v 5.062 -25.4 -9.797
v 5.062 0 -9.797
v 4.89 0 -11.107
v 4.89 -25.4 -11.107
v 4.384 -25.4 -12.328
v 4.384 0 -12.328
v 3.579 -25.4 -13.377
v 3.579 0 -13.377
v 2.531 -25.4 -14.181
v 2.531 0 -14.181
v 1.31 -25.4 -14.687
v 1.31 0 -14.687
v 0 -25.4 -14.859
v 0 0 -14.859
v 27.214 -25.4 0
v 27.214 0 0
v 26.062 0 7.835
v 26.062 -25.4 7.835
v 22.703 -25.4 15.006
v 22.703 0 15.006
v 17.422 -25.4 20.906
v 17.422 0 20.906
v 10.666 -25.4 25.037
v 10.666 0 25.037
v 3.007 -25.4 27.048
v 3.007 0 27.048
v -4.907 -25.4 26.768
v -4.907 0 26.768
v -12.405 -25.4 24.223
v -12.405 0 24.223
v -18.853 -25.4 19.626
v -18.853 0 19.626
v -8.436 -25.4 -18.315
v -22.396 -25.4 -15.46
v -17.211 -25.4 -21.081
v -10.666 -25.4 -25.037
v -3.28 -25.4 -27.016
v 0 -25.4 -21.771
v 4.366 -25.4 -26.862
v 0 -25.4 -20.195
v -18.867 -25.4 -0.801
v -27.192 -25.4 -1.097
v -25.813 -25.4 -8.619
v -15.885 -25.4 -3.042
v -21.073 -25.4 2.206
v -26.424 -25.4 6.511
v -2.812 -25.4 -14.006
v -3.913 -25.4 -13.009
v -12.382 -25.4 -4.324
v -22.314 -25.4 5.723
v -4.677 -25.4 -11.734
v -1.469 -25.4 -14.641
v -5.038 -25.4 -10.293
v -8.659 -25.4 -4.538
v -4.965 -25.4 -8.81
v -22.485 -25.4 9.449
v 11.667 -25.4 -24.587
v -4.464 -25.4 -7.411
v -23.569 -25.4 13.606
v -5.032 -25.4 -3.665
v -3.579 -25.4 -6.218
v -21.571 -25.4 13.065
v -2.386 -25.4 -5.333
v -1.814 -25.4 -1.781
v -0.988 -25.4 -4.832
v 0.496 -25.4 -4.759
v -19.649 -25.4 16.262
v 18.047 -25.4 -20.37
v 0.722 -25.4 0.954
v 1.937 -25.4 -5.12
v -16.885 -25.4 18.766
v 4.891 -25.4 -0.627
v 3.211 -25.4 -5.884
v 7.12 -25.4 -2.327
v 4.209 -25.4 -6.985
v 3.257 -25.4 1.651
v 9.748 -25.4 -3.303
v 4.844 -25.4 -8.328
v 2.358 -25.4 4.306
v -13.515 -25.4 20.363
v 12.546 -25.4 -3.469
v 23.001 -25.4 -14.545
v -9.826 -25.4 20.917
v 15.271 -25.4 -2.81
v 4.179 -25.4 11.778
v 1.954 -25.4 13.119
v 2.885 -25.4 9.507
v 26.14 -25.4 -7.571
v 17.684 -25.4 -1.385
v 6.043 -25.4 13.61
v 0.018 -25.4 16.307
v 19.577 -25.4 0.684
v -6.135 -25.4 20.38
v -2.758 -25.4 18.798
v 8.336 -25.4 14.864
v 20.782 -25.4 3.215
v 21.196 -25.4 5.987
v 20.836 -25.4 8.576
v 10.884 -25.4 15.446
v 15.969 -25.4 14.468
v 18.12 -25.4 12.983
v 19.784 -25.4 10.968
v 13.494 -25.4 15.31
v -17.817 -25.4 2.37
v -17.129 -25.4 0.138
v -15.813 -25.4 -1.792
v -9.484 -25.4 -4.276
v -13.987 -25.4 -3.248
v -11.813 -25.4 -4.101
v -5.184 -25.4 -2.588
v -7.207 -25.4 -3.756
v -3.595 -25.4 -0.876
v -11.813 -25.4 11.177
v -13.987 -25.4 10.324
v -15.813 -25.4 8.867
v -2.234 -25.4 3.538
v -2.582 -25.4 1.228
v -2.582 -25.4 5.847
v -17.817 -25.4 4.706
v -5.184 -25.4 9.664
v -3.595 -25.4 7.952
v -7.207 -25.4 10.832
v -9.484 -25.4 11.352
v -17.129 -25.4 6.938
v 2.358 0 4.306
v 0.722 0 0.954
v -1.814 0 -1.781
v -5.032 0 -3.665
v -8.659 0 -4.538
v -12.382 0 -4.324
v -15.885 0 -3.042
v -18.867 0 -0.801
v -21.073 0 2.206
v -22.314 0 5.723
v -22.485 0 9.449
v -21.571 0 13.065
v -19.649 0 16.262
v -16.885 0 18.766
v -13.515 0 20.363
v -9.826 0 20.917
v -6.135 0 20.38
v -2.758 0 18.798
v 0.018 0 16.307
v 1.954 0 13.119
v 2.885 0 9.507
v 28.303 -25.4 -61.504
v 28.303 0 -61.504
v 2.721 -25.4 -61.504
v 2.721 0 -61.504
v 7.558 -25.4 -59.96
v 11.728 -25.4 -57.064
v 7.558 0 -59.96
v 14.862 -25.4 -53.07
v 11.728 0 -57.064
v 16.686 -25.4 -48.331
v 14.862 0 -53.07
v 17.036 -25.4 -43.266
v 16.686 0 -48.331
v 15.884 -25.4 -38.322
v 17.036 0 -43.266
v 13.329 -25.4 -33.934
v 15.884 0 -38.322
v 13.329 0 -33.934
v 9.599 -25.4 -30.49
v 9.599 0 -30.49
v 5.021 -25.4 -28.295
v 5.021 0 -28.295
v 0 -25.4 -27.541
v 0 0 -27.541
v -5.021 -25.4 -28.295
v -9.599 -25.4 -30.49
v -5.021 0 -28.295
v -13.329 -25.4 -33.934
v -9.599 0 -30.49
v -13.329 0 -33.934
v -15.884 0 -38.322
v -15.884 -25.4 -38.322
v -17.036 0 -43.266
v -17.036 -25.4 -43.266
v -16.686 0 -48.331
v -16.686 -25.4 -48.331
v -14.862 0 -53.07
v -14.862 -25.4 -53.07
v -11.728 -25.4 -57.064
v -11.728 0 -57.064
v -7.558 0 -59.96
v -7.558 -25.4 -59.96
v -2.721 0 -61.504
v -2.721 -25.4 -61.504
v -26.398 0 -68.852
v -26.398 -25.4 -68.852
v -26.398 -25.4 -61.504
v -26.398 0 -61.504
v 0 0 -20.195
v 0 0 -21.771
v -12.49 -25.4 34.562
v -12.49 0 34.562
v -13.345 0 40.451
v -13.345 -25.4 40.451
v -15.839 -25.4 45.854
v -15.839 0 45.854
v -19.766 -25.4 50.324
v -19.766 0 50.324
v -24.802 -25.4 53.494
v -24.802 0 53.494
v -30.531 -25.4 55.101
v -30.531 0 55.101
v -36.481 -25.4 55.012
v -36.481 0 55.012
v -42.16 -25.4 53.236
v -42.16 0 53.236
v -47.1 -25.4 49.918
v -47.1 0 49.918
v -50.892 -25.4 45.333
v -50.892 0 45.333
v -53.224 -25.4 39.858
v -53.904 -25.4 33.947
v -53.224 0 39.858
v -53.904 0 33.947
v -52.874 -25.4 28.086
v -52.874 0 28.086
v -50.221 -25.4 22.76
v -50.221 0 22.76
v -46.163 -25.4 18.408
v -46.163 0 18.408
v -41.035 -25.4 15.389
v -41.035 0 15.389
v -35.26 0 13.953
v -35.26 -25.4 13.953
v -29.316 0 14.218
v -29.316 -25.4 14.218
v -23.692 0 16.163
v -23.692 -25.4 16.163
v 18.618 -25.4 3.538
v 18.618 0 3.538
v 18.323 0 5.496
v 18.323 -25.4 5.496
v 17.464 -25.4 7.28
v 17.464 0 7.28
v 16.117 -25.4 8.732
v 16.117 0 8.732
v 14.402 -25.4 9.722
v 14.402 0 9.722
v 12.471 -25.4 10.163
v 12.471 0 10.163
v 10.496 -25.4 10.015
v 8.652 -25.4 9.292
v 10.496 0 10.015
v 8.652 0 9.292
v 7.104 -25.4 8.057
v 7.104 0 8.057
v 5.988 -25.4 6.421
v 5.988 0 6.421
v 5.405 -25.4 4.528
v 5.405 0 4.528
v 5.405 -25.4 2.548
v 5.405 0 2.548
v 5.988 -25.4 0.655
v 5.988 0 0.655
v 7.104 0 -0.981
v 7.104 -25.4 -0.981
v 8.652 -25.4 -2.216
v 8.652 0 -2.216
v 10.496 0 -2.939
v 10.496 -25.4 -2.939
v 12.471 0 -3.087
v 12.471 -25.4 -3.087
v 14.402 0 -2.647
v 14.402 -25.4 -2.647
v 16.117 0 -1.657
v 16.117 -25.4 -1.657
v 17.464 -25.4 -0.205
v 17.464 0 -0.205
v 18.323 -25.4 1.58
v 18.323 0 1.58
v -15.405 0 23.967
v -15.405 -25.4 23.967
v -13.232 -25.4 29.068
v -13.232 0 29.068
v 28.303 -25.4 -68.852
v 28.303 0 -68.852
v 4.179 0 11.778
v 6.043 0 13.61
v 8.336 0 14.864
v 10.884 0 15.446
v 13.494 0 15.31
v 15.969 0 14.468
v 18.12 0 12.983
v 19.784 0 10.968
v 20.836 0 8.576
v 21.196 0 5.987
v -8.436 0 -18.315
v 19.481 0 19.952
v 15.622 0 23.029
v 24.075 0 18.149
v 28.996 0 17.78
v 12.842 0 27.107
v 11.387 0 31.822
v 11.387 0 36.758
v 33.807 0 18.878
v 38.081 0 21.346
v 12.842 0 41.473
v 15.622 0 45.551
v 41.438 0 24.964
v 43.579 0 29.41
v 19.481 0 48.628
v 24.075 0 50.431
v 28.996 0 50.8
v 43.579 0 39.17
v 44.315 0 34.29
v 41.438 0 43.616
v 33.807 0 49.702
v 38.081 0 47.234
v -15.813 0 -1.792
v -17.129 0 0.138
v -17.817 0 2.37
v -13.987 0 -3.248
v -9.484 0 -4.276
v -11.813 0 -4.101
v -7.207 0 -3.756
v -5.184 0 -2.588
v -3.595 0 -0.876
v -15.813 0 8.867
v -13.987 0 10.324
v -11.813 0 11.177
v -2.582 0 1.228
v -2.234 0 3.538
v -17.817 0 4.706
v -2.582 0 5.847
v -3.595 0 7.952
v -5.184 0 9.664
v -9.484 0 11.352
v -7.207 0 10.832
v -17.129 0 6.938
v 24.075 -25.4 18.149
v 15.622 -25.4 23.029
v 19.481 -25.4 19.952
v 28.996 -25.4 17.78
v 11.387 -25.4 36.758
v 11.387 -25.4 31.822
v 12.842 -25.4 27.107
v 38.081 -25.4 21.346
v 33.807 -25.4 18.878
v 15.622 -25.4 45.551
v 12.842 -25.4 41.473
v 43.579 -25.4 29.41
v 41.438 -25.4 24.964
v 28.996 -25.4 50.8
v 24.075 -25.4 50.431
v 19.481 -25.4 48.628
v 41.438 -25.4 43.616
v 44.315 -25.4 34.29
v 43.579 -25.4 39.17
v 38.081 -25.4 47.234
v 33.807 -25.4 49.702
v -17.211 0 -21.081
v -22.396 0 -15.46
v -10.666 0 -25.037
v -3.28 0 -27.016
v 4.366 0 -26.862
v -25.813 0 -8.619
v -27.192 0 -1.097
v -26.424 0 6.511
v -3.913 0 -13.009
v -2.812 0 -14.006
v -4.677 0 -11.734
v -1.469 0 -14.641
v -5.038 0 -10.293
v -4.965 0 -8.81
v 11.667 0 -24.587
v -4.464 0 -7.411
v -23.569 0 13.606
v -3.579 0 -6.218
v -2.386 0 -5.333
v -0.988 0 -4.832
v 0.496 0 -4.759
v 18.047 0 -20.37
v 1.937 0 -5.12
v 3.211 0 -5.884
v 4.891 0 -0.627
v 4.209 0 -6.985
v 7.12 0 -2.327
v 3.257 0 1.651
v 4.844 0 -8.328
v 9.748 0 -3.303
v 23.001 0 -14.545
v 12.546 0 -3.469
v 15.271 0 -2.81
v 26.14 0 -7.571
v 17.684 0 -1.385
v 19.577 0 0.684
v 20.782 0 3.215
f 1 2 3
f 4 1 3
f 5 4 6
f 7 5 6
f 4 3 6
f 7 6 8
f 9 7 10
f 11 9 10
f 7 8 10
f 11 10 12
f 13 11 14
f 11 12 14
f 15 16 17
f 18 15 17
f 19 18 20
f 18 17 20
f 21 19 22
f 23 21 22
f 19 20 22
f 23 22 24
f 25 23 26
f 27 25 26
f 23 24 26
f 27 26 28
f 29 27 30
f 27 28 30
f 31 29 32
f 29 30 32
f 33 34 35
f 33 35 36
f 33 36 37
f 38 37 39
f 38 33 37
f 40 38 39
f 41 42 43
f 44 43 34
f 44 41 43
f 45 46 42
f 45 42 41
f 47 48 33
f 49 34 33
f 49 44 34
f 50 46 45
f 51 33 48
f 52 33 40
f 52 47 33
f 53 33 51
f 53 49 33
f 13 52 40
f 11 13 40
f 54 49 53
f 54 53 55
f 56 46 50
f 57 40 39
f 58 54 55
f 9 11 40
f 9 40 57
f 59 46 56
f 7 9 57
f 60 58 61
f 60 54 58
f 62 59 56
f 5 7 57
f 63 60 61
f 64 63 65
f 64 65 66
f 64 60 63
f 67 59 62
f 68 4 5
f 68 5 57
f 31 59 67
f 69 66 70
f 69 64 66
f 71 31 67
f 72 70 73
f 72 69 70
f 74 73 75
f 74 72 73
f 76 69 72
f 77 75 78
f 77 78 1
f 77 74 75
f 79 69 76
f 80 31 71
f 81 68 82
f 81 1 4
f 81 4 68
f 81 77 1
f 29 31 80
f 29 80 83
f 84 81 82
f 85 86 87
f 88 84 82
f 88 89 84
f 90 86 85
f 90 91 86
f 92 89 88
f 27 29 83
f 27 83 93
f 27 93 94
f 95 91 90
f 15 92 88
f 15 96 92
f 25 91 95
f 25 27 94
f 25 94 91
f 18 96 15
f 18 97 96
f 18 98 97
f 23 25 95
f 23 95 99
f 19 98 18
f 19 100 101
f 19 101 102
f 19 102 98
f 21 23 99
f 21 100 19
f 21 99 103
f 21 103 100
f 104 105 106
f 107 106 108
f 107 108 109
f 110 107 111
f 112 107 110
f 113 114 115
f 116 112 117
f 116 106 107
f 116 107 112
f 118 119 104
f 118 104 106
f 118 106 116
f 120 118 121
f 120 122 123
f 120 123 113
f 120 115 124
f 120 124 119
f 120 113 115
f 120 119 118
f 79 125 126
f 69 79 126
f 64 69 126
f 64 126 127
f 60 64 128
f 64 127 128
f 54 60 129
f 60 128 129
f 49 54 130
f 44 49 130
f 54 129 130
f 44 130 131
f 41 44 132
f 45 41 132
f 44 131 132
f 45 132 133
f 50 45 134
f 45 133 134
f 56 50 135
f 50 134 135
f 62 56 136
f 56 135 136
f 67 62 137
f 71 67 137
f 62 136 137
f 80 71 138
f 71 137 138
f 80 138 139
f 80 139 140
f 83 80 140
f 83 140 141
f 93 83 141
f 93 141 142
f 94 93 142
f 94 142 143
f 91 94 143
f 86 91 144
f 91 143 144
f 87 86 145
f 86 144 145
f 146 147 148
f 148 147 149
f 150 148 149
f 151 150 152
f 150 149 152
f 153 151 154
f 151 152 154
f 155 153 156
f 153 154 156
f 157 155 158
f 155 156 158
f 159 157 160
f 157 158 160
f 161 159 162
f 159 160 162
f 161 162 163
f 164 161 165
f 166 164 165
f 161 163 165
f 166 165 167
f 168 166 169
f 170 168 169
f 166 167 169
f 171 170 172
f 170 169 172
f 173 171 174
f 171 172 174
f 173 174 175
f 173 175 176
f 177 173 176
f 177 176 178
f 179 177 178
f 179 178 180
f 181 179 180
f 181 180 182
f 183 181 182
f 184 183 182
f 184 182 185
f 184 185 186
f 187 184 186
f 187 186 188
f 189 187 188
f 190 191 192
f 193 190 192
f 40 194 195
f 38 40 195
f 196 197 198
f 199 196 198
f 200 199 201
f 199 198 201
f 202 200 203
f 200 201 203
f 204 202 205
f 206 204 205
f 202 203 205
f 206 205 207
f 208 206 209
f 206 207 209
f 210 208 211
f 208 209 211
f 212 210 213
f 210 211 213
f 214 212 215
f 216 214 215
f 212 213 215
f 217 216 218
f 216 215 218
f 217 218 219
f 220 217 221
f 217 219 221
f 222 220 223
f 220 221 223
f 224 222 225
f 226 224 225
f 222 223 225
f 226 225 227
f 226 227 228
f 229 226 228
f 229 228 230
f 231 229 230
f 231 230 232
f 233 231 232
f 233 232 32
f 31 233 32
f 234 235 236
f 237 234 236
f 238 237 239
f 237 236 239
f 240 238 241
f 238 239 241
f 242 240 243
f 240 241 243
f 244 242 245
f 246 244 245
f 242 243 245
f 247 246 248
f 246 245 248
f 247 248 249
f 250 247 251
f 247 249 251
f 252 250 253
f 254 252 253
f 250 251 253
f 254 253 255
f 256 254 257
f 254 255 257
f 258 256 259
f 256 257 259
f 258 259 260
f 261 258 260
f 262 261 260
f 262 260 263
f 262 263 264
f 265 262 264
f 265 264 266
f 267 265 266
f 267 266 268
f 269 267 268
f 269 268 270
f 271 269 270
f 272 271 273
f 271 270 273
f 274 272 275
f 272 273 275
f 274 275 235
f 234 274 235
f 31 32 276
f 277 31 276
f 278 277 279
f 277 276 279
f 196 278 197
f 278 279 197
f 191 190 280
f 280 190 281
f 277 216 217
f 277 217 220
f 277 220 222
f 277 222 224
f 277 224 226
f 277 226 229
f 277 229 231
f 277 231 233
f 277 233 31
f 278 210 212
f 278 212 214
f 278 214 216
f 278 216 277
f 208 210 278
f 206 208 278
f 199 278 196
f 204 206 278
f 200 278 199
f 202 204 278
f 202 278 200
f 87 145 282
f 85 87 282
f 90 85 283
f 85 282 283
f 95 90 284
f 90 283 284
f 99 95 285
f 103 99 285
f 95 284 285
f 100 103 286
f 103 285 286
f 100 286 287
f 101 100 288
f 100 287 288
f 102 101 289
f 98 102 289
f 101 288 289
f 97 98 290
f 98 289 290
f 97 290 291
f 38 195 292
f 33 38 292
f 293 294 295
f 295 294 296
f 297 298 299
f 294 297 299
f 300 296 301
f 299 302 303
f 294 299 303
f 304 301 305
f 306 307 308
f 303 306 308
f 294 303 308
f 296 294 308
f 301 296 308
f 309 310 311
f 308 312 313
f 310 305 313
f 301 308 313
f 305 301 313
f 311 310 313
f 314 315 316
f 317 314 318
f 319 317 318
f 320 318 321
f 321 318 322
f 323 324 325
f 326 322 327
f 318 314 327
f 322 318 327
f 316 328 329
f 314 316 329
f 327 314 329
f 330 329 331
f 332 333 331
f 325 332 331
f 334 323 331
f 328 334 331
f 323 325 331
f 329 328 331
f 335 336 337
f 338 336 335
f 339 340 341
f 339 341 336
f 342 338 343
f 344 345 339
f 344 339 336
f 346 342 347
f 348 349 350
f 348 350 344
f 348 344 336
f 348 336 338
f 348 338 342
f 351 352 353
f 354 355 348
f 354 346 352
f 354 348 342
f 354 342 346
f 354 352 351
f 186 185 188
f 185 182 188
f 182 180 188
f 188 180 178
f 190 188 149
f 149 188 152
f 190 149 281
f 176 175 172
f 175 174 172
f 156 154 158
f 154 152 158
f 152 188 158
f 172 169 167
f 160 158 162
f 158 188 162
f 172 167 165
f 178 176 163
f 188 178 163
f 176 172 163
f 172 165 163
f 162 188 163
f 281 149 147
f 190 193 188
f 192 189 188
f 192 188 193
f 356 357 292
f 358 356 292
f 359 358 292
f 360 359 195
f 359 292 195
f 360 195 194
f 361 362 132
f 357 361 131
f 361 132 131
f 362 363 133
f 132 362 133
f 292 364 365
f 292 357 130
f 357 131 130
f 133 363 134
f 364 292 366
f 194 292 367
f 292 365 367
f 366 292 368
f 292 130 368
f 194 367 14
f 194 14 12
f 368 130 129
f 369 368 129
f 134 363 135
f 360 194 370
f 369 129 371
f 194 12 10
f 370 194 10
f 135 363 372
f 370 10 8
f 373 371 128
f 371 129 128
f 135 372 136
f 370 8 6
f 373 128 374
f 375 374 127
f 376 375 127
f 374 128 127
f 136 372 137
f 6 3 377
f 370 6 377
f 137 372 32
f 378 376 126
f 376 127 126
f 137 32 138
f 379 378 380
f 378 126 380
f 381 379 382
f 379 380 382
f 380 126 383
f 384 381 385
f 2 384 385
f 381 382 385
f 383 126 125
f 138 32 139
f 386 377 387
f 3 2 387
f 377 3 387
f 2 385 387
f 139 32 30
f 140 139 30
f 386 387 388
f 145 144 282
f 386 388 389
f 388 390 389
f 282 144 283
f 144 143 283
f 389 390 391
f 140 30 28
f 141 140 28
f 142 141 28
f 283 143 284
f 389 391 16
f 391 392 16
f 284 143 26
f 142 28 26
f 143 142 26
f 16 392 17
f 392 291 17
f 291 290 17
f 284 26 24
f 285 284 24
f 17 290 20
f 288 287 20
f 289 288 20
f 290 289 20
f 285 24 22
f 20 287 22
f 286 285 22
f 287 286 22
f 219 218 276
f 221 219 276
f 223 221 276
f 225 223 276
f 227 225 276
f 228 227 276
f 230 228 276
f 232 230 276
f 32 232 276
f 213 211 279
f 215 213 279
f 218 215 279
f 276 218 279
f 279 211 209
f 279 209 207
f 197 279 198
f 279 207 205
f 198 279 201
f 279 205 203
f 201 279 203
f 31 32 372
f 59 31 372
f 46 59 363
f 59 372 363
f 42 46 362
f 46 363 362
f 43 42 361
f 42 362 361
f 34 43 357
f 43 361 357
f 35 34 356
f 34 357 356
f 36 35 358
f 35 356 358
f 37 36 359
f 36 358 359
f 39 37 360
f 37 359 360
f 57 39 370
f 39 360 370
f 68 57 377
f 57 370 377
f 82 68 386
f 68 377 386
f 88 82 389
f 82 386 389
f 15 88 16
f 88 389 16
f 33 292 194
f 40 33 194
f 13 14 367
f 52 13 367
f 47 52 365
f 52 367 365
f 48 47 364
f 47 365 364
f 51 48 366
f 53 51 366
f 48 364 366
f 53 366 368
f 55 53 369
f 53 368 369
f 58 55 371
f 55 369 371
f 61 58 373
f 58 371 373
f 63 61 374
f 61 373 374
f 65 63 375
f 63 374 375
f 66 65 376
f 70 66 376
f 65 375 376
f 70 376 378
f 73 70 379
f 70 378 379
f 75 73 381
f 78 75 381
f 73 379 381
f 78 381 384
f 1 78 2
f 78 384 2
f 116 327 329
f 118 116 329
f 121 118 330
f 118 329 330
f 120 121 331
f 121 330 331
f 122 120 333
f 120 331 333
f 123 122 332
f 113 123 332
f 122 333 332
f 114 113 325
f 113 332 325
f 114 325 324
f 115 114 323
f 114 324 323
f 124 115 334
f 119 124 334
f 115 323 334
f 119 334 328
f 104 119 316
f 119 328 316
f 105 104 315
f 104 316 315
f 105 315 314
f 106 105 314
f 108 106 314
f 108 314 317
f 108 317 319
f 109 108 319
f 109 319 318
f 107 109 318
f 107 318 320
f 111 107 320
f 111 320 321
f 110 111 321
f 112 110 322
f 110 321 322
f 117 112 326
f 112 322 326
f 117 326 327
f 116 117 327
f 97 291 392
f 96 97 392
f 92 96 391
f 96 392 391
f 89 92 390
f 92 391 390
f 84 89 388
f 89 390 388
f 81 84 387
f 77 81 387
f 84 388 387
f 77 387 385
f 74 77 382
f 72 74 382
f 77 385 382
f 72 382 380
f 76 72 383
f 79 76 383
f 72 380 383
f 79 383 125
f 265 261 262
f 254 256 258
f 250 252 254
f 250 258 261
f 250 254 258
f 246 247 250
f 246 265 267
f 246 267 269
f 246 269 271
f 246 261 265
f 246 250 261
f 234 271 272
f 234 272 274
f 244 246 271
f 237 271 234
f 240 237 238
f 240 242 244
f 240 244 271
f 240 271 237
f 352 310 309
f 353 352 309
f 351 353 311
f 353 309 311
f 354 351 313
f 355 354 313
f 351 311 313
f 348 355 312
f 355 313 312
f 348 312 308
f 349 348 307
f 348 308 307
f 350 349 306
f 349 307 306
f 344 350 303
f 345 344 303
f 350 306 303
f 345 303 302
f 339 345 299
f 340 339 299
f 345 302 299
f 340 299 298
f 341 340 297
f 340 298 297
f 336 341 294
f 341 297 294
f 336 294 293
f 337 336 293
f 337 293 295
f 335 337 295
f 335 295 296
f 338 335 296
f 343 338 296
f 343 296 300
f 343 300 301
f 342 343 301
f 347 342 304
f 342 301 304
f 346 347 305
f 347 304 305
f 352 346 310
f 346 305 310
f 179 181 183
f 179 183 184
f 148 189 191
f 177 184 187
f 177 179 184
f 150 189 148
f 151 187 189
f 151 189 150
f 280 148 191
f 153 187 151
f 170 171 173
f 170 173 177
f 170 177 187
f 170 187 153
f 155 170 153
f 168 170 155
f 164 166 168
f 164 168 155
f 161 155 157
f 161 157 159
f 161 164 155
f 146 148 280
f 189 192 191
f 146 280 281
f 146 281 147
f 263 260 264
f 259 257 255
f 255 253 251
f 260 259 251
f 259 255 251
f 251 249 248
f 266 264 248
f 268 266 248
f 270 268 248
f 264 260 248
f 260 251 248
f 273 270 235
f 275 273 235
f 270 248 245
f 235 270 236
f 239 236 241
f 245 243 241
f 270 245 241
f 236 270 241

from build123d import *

# Parameters (mm, degrees)
F0_R     = 16.556043
F0_R_2   = 17.09092
F1_DEPTH = 25.4
F2_W     = 25.4
F2_H     = 7.347855
F2_W_2   = 3.900714
F3_DEPTH = 25.4
F4_R     = 7.835635
F4_R_2   = 6.643855
F5_DEPTH = 25.4


with BuildPart() as f1:
    # F0 (on Front) → F1 (new body)
    with BuildSketch(Plane.XZ):
        with BuildLine():
            ThreePointArc((-18.853193, 19.625863), (-10.66633, -25.036908), (27.214286, 0))
            ThreePointArc((27.214286, 0), (10.66633, 25.036908), (-18.853193, 19.625863))
        make_face()
        Polygon((-8.436429, -18.315361), (0, -20.194977), (0, -21.771429), align=None, mode=Mode.SUBTRACT)
        with BuildLine():
            ThreePointArc((0, -14.859293), (-3.57948, -6.217662), (5.06215, -9.797143))
            ThreePointArc((5.06215, -9.797143), (3.57948, -13.376623), (0, -14.859293))
        make_face(mode=Mode.SUBTRACT)
        with BuildLine():
            ThreePointArc((2.358291, 4.30618), (-22.485275, 9.44916), (2.884977, 9.507196))
            ThreePointArc((2.884977, 9.507196), (13.494393, 15.310285), (21.195989, 5.987143))
            ThreePointArc((21.195989, 5.987143), (12.545962, -3.469132), (2.358291, 4.30618))
        make_face(mode=Mode.SUBTRACT)
        with BuildLine():
            ThreePointArc((-12.489974, 34.562144), (-52.25579, 42.679765), (-18.853193, 19.625863))
            ThreePointArc((-18.853193, 19.625863), (-14.14707, 26.444524), (-12.489974, 34.562144))
        make_face()
        with Locations((27.758574, 34.290001)):
            Circle(F0_R)
        with Locations((0, -44.631429)):
            Circle(F0_R_2)
    extrude(amount=F1_DEPTH)

    # F2 (on Front) → F3 (join)
    with BuildSketch(Plane.XZ):
        with Locations((-13.697858, -65.178213)):
            Rectangle(F2_W, F2_H)
        with Locations((11.702142, -65.178213)):
            Rectangle(F2_W, F2_H)
        with Locations((26.352499, -65.178213)):
            Rectangle(F2_W_2, F2_H)
    extrude(amount=F3_DEPTH)


with BuildPart() as f5:
    # F4 (on Front) → F5 (new body)
    with BuildSketch(Plane.XZ):
        with Locations((-10.069286, 3.537857)):
            Circle(F4_R)
        with Locations((11.974284, 3.537857)):
            Circle(F4_R_2)
    extrude(amount=F5_DEPTH)


solid = Compound([f1.part, f5.part])
